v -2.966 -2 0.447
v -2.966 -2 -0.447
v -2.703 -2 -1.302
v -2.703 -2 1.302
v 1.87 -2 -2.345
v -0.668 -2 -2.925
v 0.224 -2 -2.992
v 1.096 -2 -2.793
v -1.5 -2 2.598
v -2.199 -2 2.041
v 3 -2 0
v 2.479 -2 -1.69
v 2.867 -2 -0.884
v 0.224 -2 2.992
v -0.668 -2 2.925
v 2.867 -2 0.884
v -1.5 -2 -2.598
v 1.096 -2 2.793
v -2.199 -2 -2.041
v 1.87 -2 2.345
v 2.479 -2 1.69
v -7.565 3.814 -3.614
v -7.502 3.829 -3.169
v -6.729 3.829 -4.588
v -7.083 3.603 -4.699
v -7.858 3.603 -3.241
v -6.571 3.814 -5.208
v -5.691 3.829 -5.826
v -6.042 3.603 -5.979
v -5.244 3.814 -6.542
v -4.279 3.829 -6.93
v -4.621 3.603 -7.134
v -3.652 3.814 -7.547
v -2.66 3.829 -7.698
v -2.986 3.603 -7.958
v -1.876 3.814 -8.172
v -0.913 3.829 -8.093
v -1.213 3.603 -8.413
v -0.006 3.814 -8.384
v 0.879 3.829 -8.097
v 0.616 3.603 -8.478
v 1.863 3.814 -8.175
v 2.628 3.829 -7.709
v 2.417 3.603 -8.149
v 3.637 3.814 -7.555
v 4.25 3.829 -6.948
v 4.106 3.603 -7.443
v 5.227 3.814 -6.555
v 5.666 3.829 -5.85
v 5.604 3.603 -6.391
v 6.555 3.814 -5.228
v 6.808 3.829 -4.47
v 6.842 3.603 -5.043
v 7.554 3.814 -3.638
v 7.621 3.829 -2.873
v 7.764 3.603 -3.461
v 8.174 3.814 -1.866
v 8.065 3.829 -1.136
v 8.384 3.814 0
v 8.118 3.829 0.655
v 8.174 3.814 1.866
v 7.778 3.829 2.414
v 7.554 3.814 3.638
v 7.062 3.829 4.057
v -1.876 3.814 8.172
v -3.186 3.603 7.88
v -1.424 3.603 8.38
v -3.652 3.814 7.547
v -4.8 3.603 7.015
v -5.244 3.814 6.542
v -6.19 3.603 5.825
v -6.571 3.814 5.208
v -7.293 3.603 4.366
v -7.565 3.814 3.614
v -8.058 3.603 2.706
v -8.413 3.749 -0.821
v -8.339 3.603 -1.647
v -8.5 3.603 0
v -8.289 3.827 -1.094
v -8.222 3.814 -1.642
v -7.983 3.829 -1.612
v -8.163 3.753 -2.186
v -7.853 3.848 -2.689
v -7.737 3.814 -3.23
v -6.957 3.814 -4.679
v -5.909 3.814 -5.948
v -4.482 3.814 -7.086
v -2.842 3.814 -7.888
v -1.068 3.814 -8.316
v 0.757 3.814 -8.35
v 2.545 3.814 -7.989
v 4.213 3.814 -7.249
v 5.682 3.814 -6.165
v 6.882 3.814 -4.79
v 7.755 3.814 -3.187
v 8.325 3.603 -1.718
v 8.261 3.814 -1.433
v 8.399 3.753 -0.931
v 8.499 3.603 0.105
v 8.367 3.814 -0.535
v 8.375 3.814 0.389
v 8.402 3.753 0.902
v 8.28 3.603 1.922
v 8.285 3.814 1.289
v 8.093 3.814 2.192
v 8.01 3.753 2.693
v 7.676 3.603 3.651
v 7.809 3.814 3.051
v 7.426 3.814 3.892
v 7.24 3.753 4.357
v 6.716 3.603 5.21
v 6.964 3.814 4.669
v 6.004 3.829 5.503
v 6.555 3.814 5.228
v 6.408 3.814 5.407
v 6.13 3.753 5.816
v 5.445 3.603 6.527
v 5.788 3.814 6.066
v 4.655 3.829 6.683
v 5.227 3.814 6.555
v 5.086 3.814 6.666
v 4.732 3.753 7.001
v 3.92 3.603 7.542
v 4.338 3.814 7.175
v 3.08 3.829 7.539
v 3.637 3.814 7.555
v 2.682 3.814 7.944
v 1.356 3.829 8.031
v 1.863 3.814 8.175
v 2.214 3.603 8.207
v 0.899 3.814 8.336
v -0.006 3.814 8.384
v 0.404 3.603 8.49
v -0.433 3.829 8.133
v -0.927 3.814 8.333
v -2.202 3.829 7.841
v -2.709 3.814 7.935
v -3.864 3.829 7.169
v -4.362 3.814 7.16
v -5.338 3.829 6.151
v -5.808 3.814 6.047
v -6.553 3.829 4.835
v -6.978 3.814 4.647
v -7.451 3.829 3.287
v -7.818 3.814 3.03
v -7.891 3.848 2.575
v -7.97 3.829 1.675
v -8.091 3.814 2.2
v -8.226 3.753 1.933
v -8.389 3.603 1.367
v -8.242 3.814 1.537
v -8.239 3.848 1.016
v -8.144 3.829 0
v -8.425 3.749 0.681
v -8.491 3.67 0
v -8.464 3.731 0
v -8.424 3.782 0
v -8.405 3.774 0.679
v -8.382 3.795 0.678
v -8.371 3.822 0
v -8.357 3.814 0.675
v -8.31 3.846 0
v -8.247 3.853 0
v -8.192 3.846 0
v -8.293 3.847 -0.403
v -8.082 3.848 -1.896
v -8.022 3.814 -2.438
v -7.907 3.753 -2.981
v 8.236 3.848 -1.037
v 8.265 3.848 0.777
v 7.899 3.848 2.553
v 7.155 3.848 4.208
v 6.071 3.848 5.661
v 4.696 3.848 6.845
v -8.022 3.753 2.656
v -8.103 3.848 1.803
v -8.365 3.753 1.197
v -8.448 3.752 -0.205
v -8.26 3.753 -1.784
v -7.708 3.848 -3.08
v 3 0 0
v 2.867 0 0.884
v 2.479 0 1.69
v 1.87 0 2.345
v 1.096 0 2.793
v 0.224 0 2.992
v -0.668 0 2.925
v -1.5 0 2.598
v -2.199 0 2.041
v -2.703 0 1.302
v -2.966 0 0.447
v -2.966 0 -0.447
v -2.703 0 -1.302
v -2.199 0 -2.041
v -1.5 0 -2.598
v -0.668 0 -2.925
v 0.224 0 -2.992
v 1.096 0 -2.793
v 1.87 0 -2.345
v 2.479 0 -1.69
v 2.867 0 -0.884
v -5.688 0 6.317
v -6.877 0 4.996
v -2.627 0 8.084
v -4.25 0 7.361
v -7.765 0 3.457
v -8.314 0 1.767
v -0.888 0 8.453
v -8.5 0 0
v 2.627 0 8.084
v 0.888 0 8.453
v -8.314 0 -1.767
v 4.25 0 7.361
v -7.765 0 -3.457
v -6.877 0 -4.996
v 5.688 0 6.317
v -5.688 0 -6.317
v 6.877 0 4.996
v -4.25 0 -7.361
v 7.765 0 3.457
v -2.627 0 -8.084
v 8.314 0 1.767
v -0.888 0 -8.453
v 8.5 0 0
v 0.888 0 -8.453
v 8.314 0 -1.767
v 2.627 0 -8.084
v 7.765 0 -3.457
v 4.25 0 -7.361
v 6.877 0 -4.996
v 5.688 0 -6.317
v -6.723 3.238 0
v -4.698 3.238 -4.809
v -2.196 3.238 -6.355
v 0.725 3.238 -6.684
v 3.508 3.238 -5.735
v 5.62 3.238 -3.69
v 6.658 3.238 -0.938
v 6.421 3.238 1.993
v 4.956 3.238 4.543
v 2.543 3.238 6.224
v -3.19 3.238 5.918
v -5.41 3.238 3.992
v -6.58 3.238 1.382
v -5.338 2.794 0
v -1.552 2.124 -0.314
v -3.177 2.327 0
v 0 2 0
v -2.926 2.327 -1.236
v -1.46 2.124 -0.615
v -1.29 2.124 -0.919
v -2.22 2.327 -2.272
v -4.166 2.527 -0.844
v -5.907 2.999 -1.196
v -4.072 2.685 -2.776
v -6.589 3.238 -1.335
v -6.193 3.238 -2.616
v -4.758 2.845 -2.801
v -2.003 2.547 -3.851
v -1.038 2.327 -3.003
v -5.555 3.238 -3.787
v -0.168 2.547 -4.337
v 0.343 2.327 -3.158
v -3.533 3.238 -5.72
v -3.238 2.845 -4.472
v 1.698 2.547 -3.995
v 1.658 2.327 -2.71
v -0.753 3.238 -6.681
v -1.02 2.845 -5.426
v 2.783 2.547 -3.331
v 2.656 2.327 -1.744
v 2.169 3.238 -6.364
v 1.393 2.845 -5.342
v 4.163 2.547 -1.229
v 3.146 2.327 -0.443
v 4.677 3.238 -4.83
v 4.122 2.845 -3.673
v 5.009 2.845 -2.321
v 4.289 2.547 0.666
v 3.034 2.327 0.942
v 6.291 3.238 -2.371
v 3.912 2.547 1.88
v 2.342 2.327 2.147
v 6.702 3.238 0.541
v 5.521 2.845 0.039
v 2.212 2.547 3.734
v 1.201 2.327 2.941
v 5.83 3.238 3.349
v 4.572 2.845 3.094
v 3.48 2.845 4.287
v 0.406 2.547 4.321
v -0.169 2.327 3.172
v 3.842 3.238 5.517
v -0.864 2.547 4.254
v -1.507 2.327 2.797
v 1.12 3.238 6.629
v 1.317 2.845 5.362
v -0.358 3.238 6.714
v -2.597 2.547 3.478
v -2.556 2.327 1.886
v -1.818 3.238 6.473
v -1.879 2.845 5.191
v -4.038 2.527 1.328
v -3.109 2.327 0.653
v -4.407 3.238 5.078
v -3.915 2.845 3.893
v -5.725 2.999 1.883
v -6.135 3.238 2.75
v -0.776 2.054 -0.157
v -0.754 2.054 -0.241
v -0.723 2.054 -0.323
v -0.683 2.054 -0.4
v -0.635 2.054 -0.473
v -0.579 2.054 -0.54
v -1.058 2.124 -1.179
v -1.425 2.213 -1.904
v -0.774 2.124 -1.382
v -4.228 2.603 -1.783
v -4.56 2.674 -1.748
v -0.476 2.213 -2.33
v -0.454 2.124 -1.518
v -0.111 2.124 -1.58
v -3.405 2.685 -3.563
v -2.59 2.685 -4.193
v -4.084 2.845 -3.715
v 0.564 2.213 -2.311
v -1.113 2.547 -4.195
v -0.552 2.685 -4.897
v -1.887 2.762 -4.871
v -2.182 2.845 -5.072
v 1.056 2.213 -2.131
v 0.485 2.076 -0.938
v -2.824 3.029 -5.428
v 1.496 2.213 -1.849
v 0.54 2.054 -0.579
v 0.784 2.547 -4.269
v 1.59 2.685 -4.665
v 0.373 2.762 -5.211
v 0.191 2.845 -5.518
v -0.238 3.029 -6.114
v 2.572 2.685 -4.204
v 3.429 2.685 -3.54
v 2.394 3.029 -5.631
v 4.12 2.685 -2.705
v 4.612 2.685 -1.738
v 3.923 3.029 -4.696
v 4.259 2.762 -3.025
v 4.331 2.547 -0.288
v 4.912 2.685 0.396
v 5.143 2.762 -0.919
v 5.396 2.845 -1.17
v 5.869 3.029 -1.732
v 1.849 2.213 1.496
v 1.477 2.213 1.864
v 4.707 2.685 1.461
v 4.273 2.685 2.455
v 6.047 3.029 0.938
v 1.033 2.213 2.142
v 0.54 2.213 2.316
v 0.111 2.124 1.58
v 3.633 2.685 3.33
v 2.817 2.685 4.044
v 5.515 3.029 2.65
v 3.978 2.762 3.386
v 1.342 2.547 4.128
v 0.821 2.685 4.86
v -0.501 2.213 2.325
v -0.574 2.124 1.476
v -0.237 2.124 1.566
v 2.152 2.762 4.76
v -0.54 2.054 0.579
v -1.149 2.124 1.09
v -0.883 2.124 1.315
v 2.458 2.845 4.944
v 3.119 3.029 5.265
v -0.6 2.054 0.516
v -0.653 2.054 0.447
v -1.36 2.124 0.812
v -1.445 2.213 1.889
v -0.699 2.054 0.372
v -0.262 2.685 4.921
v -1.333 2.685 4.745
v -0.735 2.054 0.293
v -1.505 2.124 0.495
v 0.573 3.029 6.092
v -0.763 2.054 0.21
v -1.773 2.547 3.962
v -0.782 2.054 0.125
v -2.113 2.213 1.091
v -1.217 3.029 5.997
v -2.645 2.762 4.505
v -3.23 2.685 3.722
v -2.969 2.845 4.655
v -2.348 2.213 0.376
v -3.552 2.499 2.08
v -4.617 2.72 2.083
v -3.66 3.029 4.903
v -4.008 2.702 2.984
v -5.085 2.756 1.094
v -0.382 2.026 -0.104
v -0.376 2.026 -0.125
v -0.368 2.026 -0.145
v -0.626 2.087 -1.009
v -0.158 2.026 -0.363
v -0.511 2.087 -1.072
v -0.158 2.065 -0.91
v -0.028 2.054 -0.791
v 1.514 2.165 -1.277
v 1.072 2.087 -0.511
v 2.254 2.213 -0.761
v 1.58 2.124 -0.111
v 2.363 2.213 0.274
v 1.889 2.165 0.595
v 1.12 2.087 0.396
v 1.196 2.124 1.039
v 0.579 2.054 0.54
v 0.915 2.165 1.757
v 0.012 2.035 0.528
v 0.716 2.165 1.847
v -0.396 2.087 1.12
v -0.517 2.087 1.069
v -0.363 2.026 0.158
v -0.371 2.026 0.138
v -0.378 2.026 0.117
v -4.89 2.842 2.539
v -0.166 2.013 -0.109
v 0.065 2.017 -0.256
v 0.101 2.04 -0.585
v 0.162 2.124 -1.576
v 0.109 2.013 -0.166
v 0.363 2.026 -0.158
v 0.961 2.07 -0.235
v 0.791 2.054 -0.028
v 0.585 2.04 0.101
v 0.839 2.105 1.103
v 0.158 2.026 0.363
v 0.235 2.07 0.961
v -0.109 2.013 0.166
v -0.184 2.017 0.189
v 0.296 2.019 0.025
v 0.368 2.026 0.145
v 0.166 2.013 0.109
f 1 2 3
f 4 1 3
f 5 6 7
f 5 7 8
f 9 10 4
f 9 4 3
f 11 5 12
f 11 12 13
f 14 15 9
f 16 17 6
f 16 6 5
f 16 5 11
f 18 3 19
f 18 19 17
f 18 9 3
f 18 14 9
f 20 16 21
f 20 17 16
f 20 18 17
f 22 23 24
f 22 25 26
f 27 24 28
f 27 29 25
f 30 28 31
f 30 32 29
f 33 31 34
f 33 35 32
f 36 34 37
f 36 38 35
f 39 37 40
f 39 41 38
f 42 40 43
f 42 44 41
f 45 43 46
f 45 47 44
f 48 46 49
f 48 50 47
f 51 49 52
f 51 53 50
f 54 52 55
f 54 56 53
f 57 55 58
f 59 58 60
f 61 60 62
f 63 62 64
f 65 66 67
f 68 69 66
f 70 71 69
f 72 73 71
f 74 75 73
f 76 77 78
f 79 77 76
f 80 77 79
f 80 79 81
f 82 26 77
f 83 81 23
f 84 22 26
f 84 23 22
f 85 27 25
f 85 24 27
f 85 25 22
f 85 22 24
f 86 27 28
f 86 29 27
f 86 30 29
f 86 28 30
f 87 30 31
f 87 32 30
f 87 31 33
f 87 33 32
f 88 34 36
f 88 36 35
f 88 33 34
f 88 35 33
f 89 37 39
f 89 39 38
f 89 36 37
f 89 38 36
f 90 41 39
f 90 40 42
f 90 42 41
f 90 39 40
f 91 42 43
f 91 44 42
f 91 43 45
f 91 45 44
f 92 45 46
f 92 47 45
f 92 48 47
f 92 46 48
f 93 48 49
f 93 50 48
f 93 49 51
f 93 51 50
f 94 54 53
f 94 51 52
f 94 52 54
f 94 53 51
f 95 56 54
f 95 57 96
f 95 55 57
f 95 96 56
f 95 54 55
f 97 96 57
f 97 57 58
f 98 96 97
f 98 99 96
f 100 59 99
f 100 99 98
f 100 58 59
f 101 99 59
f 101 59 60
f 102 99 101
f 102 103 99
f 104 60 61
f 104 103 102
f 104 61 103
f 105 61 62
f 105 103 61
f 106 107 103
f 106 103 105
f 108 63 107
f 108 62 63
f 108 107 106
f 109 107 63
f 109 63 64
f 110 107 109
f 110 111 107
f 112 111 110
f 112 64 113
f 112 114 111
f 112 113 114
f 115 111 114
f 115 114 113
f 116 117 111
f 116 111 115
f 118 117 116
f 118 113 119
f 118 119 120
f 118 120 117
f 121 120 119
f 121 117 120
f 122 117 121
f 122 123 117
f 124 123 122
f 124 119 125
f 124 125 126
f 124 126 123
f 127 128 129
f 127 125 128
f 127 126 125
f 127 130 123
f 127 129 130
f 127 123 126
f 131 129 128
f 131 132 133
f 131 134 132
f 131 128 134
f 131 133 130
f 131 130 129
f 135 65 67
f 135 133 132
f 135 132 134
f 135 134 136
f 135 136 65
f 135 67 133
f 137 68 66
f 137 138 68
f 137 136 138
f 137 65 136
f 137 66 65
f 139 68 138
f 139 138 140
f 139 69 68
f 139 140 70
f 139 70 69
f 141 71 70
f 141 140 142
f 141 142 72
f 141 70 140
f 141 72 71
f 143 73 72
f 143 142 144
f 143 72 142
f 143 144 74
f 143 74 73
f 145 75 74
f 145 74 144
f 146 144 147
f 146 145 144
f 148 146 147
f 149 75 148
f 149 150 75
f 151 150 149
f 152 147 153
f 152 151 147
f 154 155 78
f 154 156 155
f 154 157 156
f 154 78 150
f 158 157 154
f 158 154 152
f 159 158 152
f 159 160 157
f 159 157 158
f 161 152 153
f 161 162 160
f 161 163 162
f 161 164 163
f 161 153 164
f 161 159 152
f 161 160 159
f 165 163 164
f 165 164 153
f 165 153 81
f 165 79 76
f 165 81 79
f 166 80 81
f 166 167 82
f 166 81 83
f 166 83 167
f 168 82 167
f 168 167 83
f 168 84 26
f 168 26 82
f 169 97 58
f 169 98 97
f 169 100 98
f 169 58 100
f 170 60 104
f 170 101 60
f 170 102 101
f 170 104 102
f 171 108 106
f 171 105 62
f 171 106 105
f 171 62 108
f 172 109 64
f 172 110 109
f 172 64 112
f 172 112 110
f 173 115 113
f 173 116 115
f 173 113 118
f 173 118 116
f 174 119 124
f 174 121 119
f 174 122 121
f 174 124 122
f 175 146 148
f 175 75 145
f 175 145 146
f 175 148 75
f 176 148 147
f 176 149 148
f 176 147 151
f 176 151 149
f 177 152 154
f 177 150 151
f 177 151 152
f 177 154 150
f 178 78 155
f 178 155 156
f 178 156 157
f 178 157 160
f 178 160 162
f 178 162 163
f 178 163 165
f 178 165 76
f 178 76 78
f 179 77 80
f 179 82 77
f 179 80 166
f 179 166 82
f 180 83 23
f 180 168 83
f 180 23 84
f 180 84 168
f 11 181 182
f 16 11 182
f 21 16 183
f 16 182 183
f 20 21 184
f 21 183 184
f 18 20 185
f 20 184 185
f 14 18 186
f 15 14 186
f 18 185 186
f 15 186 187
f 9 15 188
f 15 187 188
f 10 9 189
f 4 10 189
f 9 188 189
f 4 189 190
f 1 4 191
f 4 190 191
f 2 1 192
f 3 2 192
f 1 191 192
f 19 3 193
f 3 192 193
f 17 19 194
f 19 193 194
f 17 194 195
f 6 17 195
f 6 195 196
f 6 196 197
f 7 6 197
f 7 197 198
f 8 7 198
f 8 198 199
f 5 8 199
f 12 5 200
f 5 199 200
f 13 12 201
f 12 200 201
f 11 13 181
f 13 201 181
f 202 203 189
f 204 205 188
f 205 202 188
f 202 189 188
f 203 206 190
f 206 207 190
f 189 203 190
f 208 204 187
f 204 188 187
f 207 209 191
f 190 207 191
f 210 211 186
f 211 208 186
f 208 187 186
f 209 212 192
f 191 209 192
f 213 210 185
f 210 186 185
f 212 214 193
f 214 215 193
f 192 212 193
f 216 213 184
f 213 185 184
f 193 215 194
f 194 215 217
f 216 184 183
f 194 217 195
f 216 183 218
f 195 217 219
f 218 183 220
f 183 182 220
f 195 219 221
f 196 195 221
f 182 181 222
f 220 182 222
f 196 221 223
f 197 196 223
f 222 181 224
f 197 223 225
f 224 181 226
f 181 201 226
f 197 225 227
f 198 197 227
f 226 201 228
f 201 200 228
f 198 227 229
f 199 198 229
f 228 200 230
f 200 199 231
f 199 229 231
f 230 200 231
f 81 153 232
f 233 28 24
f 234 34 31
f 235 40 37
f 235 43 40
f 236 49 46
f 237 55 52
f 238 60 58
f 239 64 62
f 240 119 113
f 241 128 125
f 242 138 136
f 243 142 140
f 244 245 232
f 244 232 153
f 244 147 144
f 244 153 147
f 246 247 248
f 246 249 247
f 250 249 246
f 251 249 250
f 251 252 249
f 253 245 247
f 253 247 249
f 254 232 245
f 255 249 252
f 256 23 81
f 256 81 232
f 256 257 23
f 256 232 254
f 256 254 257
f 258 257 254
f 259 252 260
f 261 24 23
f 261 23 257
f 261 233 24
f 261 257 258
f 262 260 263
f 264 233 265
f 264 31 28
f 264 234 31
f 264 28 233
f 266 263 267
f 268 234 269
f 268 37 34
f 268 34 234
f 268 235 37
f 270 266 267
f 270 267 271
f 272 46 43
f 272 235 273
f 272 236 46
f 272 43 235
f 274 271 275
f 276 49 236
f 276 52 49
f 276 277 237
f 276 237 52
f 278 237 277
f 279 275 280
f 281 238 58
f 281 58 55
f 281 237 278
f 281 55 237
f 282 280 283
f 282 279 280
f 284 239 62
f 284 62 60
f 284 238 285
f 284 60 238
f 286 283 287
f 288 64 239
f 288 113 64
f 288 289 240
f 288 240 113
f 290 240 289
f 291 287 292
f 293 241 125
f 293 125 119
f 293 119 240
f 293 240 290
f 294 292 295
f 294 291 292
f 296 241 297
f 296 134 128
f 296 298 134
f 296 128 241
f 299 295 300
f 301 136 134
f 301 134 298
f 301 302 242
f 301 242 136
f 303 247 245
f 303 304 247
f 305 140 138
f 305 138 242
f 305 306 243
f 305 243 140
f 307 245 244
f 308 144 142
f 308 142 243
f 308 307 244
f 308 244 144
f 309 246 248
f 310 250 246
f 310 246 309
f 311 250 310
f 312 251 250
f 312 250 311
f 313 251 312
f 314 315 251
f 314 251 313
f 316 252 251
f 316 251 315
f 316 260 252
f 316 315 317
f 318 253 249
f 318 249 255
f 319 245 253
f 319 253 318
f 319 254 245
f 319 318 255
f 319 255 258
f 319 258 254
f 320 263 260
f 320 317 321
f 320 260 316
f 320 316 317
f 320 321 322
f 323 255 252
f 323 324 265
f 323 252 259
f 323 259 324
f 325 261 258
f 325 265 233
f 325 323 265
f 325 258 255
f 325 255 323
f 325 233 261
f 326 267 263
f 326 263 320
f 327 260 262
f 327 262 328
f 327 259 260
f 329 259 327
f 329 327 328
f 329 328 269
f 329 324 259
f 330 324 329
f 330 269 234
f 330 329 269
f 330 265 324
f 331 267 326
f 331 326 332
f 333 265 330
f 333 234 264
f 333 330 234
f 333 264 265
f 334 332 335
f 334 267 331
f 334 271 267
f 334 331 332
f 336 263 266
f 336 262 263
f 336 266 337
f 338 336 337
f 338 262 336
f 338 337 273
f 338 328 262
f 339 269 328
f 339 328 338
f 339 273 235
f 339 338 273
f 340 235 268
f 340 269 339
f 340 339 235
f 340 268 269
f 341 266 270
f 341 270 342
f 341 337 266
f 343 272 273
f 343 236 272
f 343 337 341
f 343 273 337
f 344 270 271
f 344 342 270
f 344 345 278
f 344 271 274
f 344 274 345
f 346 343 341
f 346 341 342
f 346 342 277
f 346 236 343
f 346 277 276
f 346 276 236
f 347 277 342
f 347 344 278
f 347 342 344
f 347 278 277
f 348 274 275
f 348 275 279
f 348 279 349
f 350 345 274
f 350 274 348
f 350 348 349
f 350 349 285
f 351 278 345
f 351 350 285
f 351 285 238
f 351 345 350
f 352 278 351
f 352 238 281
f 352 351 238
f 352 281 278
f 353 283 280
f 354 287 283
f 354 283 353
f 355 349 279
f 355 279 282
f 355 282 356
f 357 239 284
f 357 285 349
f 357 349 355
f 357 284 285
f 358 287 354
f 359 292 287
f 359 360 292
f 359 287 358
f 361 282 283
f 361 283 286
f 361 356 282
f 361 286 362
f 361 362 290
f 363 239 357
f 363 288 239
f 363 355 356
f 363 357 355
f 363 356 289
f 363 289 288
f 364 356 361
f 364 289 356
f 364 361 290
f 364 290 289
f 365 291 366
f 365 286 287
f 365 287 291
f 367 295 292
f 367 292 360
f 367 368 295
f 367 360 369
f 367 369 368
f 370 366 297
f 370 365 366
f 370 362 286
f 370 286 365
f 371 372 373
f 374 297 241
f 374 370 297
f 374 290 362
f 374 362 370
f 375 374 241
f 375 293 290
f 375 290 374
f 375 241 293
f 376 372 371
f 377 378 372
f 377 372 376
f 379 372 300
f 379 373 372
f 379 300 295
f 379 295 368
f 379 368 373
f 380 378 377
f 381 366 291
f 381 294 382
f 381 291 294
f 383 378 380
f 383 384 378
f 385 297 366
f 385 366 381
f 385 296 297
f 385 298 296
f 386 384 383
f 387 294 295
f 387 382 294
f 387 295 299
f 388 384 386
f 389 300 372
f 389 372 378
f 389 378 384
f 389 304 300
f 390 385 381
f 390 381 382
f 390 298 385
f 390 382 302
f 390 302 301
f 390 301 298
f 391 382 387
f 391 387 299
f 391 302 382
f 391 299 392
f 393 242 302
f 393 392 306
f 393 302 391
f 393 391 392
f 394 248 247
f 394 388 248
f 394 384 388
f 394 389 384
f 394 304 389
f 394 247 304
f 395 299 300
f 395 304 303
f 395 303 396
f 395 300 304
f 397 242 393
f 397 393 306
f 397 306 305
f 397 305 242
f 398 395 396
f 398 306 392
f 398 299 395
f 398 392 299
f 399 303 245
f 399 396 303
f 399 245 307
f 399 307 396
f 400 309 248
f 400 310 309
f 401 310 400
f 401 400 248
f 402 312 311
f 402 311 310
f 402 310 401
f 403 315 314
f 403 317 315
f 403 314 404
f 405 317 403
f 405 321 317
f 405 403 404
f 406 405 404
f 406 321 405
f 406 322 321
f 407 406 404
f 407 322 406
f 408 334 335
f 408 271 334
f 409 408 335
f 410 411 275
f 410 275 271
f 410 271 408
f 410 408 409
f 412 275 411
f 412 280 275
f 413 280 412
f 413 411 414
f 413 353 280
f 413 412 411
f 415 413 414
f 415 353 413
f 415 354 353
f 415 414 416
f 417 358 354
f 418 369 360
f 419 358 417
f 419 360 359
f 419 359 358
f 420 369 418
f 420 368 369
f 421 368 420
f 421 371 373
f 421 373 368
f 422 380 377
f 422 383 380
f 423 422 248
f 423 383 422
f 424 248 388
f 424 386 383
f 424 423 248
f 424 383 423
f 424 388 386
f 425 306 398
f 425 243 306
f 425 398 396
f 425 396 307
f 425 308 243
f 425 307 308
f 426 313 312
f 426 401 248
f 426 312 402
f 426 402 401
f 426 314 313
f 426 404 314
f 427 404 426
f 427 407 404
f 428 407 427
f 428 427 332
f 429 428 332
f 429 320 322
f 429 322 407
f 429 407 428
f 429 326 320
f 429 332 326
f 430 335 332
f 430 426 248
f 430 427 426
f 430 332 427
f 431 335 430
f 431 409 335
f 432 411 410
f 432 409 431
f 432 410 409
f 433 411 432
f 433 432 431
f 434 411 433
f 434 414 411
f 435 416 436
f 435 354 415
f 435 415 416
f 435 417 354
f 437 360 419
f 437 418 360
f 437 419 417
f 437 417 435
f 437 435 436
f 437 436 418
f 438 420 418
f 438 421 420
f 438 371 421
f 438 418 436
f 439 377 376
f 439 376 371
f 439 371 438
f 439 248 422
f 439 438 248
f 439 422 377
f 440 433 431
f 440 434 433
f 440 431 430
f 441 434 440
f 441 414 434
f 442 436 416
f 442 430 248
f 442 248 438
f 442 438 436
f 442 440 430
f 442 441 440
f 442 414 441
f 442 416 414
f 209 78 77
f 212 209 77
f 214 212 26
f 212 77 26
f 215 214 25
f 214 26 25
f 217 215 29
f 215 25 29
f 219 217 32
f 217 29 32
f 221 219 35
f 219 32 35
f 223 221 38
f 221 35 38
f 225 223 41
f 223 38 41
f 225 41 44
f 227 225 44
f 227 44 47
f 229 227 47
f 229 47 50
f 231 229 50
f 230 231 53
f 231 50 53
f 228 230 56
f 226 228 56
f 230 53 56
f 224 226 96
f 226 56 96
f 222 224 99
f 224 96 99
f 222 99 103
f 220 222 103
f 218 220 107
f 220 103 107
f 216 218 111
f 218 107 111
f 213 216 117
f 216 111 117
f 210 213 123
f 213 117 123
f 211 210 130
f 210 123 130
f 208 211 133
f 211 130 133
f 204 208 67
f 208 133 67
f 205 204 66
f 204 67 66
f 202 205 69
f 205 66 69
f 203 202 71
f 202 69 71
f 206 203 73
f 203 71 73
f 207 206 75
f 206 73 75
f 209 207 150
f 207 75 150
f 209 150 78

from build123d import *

# Parameters (mm, degrees)
FILLET1_R           = 0.25
SKETCH2_R           = 3
BOSS_EXTRUDE1_DEPTH = 2


with BuildPart() as part:
    # Sketch1 → Revolve1 (revolve)
    with BuildSketch(Plane.XY, mode=Mode.PRIVATE) as revolve1_sk:
        with BuildLine():
            Line((0, 2), (0, 0))
            Line((0, 0), (8.5, 0))
            Line((8.5, 0), (8.5, 4))
            add(Edge.make_bspline(
                [(0, 2), (2.747861556, 2.169330532), (5.476127383, 2.511075109), (8.5, 4)],
                knots=[0, 0, 0, 0, 1, 1, 1, 1], degree=3))
        make_face()
    revolve(revolve1_sk.sketch.rotate(Axis((0, 2, 0), (0, -1, 0)), 180), axis=Axis((0, 2, 0), (0, -1, 0)))

    # Fillet1
    fillet1_edges = [part.edges().sort_by_distance(p)[0] for p in [
        (8.5, 4, 0),
    ]]
    fillet(fillet1_edges, radius=FILLET1_R)

    # Sketch2 → Boss-Extrude1 (add)
    with BuildSketch(Plane.XZ):
        Circle(SKETCH2_R)
    extrude(amount=BOSS_EXTRUDE1_DEPTH)


solid = part.part
